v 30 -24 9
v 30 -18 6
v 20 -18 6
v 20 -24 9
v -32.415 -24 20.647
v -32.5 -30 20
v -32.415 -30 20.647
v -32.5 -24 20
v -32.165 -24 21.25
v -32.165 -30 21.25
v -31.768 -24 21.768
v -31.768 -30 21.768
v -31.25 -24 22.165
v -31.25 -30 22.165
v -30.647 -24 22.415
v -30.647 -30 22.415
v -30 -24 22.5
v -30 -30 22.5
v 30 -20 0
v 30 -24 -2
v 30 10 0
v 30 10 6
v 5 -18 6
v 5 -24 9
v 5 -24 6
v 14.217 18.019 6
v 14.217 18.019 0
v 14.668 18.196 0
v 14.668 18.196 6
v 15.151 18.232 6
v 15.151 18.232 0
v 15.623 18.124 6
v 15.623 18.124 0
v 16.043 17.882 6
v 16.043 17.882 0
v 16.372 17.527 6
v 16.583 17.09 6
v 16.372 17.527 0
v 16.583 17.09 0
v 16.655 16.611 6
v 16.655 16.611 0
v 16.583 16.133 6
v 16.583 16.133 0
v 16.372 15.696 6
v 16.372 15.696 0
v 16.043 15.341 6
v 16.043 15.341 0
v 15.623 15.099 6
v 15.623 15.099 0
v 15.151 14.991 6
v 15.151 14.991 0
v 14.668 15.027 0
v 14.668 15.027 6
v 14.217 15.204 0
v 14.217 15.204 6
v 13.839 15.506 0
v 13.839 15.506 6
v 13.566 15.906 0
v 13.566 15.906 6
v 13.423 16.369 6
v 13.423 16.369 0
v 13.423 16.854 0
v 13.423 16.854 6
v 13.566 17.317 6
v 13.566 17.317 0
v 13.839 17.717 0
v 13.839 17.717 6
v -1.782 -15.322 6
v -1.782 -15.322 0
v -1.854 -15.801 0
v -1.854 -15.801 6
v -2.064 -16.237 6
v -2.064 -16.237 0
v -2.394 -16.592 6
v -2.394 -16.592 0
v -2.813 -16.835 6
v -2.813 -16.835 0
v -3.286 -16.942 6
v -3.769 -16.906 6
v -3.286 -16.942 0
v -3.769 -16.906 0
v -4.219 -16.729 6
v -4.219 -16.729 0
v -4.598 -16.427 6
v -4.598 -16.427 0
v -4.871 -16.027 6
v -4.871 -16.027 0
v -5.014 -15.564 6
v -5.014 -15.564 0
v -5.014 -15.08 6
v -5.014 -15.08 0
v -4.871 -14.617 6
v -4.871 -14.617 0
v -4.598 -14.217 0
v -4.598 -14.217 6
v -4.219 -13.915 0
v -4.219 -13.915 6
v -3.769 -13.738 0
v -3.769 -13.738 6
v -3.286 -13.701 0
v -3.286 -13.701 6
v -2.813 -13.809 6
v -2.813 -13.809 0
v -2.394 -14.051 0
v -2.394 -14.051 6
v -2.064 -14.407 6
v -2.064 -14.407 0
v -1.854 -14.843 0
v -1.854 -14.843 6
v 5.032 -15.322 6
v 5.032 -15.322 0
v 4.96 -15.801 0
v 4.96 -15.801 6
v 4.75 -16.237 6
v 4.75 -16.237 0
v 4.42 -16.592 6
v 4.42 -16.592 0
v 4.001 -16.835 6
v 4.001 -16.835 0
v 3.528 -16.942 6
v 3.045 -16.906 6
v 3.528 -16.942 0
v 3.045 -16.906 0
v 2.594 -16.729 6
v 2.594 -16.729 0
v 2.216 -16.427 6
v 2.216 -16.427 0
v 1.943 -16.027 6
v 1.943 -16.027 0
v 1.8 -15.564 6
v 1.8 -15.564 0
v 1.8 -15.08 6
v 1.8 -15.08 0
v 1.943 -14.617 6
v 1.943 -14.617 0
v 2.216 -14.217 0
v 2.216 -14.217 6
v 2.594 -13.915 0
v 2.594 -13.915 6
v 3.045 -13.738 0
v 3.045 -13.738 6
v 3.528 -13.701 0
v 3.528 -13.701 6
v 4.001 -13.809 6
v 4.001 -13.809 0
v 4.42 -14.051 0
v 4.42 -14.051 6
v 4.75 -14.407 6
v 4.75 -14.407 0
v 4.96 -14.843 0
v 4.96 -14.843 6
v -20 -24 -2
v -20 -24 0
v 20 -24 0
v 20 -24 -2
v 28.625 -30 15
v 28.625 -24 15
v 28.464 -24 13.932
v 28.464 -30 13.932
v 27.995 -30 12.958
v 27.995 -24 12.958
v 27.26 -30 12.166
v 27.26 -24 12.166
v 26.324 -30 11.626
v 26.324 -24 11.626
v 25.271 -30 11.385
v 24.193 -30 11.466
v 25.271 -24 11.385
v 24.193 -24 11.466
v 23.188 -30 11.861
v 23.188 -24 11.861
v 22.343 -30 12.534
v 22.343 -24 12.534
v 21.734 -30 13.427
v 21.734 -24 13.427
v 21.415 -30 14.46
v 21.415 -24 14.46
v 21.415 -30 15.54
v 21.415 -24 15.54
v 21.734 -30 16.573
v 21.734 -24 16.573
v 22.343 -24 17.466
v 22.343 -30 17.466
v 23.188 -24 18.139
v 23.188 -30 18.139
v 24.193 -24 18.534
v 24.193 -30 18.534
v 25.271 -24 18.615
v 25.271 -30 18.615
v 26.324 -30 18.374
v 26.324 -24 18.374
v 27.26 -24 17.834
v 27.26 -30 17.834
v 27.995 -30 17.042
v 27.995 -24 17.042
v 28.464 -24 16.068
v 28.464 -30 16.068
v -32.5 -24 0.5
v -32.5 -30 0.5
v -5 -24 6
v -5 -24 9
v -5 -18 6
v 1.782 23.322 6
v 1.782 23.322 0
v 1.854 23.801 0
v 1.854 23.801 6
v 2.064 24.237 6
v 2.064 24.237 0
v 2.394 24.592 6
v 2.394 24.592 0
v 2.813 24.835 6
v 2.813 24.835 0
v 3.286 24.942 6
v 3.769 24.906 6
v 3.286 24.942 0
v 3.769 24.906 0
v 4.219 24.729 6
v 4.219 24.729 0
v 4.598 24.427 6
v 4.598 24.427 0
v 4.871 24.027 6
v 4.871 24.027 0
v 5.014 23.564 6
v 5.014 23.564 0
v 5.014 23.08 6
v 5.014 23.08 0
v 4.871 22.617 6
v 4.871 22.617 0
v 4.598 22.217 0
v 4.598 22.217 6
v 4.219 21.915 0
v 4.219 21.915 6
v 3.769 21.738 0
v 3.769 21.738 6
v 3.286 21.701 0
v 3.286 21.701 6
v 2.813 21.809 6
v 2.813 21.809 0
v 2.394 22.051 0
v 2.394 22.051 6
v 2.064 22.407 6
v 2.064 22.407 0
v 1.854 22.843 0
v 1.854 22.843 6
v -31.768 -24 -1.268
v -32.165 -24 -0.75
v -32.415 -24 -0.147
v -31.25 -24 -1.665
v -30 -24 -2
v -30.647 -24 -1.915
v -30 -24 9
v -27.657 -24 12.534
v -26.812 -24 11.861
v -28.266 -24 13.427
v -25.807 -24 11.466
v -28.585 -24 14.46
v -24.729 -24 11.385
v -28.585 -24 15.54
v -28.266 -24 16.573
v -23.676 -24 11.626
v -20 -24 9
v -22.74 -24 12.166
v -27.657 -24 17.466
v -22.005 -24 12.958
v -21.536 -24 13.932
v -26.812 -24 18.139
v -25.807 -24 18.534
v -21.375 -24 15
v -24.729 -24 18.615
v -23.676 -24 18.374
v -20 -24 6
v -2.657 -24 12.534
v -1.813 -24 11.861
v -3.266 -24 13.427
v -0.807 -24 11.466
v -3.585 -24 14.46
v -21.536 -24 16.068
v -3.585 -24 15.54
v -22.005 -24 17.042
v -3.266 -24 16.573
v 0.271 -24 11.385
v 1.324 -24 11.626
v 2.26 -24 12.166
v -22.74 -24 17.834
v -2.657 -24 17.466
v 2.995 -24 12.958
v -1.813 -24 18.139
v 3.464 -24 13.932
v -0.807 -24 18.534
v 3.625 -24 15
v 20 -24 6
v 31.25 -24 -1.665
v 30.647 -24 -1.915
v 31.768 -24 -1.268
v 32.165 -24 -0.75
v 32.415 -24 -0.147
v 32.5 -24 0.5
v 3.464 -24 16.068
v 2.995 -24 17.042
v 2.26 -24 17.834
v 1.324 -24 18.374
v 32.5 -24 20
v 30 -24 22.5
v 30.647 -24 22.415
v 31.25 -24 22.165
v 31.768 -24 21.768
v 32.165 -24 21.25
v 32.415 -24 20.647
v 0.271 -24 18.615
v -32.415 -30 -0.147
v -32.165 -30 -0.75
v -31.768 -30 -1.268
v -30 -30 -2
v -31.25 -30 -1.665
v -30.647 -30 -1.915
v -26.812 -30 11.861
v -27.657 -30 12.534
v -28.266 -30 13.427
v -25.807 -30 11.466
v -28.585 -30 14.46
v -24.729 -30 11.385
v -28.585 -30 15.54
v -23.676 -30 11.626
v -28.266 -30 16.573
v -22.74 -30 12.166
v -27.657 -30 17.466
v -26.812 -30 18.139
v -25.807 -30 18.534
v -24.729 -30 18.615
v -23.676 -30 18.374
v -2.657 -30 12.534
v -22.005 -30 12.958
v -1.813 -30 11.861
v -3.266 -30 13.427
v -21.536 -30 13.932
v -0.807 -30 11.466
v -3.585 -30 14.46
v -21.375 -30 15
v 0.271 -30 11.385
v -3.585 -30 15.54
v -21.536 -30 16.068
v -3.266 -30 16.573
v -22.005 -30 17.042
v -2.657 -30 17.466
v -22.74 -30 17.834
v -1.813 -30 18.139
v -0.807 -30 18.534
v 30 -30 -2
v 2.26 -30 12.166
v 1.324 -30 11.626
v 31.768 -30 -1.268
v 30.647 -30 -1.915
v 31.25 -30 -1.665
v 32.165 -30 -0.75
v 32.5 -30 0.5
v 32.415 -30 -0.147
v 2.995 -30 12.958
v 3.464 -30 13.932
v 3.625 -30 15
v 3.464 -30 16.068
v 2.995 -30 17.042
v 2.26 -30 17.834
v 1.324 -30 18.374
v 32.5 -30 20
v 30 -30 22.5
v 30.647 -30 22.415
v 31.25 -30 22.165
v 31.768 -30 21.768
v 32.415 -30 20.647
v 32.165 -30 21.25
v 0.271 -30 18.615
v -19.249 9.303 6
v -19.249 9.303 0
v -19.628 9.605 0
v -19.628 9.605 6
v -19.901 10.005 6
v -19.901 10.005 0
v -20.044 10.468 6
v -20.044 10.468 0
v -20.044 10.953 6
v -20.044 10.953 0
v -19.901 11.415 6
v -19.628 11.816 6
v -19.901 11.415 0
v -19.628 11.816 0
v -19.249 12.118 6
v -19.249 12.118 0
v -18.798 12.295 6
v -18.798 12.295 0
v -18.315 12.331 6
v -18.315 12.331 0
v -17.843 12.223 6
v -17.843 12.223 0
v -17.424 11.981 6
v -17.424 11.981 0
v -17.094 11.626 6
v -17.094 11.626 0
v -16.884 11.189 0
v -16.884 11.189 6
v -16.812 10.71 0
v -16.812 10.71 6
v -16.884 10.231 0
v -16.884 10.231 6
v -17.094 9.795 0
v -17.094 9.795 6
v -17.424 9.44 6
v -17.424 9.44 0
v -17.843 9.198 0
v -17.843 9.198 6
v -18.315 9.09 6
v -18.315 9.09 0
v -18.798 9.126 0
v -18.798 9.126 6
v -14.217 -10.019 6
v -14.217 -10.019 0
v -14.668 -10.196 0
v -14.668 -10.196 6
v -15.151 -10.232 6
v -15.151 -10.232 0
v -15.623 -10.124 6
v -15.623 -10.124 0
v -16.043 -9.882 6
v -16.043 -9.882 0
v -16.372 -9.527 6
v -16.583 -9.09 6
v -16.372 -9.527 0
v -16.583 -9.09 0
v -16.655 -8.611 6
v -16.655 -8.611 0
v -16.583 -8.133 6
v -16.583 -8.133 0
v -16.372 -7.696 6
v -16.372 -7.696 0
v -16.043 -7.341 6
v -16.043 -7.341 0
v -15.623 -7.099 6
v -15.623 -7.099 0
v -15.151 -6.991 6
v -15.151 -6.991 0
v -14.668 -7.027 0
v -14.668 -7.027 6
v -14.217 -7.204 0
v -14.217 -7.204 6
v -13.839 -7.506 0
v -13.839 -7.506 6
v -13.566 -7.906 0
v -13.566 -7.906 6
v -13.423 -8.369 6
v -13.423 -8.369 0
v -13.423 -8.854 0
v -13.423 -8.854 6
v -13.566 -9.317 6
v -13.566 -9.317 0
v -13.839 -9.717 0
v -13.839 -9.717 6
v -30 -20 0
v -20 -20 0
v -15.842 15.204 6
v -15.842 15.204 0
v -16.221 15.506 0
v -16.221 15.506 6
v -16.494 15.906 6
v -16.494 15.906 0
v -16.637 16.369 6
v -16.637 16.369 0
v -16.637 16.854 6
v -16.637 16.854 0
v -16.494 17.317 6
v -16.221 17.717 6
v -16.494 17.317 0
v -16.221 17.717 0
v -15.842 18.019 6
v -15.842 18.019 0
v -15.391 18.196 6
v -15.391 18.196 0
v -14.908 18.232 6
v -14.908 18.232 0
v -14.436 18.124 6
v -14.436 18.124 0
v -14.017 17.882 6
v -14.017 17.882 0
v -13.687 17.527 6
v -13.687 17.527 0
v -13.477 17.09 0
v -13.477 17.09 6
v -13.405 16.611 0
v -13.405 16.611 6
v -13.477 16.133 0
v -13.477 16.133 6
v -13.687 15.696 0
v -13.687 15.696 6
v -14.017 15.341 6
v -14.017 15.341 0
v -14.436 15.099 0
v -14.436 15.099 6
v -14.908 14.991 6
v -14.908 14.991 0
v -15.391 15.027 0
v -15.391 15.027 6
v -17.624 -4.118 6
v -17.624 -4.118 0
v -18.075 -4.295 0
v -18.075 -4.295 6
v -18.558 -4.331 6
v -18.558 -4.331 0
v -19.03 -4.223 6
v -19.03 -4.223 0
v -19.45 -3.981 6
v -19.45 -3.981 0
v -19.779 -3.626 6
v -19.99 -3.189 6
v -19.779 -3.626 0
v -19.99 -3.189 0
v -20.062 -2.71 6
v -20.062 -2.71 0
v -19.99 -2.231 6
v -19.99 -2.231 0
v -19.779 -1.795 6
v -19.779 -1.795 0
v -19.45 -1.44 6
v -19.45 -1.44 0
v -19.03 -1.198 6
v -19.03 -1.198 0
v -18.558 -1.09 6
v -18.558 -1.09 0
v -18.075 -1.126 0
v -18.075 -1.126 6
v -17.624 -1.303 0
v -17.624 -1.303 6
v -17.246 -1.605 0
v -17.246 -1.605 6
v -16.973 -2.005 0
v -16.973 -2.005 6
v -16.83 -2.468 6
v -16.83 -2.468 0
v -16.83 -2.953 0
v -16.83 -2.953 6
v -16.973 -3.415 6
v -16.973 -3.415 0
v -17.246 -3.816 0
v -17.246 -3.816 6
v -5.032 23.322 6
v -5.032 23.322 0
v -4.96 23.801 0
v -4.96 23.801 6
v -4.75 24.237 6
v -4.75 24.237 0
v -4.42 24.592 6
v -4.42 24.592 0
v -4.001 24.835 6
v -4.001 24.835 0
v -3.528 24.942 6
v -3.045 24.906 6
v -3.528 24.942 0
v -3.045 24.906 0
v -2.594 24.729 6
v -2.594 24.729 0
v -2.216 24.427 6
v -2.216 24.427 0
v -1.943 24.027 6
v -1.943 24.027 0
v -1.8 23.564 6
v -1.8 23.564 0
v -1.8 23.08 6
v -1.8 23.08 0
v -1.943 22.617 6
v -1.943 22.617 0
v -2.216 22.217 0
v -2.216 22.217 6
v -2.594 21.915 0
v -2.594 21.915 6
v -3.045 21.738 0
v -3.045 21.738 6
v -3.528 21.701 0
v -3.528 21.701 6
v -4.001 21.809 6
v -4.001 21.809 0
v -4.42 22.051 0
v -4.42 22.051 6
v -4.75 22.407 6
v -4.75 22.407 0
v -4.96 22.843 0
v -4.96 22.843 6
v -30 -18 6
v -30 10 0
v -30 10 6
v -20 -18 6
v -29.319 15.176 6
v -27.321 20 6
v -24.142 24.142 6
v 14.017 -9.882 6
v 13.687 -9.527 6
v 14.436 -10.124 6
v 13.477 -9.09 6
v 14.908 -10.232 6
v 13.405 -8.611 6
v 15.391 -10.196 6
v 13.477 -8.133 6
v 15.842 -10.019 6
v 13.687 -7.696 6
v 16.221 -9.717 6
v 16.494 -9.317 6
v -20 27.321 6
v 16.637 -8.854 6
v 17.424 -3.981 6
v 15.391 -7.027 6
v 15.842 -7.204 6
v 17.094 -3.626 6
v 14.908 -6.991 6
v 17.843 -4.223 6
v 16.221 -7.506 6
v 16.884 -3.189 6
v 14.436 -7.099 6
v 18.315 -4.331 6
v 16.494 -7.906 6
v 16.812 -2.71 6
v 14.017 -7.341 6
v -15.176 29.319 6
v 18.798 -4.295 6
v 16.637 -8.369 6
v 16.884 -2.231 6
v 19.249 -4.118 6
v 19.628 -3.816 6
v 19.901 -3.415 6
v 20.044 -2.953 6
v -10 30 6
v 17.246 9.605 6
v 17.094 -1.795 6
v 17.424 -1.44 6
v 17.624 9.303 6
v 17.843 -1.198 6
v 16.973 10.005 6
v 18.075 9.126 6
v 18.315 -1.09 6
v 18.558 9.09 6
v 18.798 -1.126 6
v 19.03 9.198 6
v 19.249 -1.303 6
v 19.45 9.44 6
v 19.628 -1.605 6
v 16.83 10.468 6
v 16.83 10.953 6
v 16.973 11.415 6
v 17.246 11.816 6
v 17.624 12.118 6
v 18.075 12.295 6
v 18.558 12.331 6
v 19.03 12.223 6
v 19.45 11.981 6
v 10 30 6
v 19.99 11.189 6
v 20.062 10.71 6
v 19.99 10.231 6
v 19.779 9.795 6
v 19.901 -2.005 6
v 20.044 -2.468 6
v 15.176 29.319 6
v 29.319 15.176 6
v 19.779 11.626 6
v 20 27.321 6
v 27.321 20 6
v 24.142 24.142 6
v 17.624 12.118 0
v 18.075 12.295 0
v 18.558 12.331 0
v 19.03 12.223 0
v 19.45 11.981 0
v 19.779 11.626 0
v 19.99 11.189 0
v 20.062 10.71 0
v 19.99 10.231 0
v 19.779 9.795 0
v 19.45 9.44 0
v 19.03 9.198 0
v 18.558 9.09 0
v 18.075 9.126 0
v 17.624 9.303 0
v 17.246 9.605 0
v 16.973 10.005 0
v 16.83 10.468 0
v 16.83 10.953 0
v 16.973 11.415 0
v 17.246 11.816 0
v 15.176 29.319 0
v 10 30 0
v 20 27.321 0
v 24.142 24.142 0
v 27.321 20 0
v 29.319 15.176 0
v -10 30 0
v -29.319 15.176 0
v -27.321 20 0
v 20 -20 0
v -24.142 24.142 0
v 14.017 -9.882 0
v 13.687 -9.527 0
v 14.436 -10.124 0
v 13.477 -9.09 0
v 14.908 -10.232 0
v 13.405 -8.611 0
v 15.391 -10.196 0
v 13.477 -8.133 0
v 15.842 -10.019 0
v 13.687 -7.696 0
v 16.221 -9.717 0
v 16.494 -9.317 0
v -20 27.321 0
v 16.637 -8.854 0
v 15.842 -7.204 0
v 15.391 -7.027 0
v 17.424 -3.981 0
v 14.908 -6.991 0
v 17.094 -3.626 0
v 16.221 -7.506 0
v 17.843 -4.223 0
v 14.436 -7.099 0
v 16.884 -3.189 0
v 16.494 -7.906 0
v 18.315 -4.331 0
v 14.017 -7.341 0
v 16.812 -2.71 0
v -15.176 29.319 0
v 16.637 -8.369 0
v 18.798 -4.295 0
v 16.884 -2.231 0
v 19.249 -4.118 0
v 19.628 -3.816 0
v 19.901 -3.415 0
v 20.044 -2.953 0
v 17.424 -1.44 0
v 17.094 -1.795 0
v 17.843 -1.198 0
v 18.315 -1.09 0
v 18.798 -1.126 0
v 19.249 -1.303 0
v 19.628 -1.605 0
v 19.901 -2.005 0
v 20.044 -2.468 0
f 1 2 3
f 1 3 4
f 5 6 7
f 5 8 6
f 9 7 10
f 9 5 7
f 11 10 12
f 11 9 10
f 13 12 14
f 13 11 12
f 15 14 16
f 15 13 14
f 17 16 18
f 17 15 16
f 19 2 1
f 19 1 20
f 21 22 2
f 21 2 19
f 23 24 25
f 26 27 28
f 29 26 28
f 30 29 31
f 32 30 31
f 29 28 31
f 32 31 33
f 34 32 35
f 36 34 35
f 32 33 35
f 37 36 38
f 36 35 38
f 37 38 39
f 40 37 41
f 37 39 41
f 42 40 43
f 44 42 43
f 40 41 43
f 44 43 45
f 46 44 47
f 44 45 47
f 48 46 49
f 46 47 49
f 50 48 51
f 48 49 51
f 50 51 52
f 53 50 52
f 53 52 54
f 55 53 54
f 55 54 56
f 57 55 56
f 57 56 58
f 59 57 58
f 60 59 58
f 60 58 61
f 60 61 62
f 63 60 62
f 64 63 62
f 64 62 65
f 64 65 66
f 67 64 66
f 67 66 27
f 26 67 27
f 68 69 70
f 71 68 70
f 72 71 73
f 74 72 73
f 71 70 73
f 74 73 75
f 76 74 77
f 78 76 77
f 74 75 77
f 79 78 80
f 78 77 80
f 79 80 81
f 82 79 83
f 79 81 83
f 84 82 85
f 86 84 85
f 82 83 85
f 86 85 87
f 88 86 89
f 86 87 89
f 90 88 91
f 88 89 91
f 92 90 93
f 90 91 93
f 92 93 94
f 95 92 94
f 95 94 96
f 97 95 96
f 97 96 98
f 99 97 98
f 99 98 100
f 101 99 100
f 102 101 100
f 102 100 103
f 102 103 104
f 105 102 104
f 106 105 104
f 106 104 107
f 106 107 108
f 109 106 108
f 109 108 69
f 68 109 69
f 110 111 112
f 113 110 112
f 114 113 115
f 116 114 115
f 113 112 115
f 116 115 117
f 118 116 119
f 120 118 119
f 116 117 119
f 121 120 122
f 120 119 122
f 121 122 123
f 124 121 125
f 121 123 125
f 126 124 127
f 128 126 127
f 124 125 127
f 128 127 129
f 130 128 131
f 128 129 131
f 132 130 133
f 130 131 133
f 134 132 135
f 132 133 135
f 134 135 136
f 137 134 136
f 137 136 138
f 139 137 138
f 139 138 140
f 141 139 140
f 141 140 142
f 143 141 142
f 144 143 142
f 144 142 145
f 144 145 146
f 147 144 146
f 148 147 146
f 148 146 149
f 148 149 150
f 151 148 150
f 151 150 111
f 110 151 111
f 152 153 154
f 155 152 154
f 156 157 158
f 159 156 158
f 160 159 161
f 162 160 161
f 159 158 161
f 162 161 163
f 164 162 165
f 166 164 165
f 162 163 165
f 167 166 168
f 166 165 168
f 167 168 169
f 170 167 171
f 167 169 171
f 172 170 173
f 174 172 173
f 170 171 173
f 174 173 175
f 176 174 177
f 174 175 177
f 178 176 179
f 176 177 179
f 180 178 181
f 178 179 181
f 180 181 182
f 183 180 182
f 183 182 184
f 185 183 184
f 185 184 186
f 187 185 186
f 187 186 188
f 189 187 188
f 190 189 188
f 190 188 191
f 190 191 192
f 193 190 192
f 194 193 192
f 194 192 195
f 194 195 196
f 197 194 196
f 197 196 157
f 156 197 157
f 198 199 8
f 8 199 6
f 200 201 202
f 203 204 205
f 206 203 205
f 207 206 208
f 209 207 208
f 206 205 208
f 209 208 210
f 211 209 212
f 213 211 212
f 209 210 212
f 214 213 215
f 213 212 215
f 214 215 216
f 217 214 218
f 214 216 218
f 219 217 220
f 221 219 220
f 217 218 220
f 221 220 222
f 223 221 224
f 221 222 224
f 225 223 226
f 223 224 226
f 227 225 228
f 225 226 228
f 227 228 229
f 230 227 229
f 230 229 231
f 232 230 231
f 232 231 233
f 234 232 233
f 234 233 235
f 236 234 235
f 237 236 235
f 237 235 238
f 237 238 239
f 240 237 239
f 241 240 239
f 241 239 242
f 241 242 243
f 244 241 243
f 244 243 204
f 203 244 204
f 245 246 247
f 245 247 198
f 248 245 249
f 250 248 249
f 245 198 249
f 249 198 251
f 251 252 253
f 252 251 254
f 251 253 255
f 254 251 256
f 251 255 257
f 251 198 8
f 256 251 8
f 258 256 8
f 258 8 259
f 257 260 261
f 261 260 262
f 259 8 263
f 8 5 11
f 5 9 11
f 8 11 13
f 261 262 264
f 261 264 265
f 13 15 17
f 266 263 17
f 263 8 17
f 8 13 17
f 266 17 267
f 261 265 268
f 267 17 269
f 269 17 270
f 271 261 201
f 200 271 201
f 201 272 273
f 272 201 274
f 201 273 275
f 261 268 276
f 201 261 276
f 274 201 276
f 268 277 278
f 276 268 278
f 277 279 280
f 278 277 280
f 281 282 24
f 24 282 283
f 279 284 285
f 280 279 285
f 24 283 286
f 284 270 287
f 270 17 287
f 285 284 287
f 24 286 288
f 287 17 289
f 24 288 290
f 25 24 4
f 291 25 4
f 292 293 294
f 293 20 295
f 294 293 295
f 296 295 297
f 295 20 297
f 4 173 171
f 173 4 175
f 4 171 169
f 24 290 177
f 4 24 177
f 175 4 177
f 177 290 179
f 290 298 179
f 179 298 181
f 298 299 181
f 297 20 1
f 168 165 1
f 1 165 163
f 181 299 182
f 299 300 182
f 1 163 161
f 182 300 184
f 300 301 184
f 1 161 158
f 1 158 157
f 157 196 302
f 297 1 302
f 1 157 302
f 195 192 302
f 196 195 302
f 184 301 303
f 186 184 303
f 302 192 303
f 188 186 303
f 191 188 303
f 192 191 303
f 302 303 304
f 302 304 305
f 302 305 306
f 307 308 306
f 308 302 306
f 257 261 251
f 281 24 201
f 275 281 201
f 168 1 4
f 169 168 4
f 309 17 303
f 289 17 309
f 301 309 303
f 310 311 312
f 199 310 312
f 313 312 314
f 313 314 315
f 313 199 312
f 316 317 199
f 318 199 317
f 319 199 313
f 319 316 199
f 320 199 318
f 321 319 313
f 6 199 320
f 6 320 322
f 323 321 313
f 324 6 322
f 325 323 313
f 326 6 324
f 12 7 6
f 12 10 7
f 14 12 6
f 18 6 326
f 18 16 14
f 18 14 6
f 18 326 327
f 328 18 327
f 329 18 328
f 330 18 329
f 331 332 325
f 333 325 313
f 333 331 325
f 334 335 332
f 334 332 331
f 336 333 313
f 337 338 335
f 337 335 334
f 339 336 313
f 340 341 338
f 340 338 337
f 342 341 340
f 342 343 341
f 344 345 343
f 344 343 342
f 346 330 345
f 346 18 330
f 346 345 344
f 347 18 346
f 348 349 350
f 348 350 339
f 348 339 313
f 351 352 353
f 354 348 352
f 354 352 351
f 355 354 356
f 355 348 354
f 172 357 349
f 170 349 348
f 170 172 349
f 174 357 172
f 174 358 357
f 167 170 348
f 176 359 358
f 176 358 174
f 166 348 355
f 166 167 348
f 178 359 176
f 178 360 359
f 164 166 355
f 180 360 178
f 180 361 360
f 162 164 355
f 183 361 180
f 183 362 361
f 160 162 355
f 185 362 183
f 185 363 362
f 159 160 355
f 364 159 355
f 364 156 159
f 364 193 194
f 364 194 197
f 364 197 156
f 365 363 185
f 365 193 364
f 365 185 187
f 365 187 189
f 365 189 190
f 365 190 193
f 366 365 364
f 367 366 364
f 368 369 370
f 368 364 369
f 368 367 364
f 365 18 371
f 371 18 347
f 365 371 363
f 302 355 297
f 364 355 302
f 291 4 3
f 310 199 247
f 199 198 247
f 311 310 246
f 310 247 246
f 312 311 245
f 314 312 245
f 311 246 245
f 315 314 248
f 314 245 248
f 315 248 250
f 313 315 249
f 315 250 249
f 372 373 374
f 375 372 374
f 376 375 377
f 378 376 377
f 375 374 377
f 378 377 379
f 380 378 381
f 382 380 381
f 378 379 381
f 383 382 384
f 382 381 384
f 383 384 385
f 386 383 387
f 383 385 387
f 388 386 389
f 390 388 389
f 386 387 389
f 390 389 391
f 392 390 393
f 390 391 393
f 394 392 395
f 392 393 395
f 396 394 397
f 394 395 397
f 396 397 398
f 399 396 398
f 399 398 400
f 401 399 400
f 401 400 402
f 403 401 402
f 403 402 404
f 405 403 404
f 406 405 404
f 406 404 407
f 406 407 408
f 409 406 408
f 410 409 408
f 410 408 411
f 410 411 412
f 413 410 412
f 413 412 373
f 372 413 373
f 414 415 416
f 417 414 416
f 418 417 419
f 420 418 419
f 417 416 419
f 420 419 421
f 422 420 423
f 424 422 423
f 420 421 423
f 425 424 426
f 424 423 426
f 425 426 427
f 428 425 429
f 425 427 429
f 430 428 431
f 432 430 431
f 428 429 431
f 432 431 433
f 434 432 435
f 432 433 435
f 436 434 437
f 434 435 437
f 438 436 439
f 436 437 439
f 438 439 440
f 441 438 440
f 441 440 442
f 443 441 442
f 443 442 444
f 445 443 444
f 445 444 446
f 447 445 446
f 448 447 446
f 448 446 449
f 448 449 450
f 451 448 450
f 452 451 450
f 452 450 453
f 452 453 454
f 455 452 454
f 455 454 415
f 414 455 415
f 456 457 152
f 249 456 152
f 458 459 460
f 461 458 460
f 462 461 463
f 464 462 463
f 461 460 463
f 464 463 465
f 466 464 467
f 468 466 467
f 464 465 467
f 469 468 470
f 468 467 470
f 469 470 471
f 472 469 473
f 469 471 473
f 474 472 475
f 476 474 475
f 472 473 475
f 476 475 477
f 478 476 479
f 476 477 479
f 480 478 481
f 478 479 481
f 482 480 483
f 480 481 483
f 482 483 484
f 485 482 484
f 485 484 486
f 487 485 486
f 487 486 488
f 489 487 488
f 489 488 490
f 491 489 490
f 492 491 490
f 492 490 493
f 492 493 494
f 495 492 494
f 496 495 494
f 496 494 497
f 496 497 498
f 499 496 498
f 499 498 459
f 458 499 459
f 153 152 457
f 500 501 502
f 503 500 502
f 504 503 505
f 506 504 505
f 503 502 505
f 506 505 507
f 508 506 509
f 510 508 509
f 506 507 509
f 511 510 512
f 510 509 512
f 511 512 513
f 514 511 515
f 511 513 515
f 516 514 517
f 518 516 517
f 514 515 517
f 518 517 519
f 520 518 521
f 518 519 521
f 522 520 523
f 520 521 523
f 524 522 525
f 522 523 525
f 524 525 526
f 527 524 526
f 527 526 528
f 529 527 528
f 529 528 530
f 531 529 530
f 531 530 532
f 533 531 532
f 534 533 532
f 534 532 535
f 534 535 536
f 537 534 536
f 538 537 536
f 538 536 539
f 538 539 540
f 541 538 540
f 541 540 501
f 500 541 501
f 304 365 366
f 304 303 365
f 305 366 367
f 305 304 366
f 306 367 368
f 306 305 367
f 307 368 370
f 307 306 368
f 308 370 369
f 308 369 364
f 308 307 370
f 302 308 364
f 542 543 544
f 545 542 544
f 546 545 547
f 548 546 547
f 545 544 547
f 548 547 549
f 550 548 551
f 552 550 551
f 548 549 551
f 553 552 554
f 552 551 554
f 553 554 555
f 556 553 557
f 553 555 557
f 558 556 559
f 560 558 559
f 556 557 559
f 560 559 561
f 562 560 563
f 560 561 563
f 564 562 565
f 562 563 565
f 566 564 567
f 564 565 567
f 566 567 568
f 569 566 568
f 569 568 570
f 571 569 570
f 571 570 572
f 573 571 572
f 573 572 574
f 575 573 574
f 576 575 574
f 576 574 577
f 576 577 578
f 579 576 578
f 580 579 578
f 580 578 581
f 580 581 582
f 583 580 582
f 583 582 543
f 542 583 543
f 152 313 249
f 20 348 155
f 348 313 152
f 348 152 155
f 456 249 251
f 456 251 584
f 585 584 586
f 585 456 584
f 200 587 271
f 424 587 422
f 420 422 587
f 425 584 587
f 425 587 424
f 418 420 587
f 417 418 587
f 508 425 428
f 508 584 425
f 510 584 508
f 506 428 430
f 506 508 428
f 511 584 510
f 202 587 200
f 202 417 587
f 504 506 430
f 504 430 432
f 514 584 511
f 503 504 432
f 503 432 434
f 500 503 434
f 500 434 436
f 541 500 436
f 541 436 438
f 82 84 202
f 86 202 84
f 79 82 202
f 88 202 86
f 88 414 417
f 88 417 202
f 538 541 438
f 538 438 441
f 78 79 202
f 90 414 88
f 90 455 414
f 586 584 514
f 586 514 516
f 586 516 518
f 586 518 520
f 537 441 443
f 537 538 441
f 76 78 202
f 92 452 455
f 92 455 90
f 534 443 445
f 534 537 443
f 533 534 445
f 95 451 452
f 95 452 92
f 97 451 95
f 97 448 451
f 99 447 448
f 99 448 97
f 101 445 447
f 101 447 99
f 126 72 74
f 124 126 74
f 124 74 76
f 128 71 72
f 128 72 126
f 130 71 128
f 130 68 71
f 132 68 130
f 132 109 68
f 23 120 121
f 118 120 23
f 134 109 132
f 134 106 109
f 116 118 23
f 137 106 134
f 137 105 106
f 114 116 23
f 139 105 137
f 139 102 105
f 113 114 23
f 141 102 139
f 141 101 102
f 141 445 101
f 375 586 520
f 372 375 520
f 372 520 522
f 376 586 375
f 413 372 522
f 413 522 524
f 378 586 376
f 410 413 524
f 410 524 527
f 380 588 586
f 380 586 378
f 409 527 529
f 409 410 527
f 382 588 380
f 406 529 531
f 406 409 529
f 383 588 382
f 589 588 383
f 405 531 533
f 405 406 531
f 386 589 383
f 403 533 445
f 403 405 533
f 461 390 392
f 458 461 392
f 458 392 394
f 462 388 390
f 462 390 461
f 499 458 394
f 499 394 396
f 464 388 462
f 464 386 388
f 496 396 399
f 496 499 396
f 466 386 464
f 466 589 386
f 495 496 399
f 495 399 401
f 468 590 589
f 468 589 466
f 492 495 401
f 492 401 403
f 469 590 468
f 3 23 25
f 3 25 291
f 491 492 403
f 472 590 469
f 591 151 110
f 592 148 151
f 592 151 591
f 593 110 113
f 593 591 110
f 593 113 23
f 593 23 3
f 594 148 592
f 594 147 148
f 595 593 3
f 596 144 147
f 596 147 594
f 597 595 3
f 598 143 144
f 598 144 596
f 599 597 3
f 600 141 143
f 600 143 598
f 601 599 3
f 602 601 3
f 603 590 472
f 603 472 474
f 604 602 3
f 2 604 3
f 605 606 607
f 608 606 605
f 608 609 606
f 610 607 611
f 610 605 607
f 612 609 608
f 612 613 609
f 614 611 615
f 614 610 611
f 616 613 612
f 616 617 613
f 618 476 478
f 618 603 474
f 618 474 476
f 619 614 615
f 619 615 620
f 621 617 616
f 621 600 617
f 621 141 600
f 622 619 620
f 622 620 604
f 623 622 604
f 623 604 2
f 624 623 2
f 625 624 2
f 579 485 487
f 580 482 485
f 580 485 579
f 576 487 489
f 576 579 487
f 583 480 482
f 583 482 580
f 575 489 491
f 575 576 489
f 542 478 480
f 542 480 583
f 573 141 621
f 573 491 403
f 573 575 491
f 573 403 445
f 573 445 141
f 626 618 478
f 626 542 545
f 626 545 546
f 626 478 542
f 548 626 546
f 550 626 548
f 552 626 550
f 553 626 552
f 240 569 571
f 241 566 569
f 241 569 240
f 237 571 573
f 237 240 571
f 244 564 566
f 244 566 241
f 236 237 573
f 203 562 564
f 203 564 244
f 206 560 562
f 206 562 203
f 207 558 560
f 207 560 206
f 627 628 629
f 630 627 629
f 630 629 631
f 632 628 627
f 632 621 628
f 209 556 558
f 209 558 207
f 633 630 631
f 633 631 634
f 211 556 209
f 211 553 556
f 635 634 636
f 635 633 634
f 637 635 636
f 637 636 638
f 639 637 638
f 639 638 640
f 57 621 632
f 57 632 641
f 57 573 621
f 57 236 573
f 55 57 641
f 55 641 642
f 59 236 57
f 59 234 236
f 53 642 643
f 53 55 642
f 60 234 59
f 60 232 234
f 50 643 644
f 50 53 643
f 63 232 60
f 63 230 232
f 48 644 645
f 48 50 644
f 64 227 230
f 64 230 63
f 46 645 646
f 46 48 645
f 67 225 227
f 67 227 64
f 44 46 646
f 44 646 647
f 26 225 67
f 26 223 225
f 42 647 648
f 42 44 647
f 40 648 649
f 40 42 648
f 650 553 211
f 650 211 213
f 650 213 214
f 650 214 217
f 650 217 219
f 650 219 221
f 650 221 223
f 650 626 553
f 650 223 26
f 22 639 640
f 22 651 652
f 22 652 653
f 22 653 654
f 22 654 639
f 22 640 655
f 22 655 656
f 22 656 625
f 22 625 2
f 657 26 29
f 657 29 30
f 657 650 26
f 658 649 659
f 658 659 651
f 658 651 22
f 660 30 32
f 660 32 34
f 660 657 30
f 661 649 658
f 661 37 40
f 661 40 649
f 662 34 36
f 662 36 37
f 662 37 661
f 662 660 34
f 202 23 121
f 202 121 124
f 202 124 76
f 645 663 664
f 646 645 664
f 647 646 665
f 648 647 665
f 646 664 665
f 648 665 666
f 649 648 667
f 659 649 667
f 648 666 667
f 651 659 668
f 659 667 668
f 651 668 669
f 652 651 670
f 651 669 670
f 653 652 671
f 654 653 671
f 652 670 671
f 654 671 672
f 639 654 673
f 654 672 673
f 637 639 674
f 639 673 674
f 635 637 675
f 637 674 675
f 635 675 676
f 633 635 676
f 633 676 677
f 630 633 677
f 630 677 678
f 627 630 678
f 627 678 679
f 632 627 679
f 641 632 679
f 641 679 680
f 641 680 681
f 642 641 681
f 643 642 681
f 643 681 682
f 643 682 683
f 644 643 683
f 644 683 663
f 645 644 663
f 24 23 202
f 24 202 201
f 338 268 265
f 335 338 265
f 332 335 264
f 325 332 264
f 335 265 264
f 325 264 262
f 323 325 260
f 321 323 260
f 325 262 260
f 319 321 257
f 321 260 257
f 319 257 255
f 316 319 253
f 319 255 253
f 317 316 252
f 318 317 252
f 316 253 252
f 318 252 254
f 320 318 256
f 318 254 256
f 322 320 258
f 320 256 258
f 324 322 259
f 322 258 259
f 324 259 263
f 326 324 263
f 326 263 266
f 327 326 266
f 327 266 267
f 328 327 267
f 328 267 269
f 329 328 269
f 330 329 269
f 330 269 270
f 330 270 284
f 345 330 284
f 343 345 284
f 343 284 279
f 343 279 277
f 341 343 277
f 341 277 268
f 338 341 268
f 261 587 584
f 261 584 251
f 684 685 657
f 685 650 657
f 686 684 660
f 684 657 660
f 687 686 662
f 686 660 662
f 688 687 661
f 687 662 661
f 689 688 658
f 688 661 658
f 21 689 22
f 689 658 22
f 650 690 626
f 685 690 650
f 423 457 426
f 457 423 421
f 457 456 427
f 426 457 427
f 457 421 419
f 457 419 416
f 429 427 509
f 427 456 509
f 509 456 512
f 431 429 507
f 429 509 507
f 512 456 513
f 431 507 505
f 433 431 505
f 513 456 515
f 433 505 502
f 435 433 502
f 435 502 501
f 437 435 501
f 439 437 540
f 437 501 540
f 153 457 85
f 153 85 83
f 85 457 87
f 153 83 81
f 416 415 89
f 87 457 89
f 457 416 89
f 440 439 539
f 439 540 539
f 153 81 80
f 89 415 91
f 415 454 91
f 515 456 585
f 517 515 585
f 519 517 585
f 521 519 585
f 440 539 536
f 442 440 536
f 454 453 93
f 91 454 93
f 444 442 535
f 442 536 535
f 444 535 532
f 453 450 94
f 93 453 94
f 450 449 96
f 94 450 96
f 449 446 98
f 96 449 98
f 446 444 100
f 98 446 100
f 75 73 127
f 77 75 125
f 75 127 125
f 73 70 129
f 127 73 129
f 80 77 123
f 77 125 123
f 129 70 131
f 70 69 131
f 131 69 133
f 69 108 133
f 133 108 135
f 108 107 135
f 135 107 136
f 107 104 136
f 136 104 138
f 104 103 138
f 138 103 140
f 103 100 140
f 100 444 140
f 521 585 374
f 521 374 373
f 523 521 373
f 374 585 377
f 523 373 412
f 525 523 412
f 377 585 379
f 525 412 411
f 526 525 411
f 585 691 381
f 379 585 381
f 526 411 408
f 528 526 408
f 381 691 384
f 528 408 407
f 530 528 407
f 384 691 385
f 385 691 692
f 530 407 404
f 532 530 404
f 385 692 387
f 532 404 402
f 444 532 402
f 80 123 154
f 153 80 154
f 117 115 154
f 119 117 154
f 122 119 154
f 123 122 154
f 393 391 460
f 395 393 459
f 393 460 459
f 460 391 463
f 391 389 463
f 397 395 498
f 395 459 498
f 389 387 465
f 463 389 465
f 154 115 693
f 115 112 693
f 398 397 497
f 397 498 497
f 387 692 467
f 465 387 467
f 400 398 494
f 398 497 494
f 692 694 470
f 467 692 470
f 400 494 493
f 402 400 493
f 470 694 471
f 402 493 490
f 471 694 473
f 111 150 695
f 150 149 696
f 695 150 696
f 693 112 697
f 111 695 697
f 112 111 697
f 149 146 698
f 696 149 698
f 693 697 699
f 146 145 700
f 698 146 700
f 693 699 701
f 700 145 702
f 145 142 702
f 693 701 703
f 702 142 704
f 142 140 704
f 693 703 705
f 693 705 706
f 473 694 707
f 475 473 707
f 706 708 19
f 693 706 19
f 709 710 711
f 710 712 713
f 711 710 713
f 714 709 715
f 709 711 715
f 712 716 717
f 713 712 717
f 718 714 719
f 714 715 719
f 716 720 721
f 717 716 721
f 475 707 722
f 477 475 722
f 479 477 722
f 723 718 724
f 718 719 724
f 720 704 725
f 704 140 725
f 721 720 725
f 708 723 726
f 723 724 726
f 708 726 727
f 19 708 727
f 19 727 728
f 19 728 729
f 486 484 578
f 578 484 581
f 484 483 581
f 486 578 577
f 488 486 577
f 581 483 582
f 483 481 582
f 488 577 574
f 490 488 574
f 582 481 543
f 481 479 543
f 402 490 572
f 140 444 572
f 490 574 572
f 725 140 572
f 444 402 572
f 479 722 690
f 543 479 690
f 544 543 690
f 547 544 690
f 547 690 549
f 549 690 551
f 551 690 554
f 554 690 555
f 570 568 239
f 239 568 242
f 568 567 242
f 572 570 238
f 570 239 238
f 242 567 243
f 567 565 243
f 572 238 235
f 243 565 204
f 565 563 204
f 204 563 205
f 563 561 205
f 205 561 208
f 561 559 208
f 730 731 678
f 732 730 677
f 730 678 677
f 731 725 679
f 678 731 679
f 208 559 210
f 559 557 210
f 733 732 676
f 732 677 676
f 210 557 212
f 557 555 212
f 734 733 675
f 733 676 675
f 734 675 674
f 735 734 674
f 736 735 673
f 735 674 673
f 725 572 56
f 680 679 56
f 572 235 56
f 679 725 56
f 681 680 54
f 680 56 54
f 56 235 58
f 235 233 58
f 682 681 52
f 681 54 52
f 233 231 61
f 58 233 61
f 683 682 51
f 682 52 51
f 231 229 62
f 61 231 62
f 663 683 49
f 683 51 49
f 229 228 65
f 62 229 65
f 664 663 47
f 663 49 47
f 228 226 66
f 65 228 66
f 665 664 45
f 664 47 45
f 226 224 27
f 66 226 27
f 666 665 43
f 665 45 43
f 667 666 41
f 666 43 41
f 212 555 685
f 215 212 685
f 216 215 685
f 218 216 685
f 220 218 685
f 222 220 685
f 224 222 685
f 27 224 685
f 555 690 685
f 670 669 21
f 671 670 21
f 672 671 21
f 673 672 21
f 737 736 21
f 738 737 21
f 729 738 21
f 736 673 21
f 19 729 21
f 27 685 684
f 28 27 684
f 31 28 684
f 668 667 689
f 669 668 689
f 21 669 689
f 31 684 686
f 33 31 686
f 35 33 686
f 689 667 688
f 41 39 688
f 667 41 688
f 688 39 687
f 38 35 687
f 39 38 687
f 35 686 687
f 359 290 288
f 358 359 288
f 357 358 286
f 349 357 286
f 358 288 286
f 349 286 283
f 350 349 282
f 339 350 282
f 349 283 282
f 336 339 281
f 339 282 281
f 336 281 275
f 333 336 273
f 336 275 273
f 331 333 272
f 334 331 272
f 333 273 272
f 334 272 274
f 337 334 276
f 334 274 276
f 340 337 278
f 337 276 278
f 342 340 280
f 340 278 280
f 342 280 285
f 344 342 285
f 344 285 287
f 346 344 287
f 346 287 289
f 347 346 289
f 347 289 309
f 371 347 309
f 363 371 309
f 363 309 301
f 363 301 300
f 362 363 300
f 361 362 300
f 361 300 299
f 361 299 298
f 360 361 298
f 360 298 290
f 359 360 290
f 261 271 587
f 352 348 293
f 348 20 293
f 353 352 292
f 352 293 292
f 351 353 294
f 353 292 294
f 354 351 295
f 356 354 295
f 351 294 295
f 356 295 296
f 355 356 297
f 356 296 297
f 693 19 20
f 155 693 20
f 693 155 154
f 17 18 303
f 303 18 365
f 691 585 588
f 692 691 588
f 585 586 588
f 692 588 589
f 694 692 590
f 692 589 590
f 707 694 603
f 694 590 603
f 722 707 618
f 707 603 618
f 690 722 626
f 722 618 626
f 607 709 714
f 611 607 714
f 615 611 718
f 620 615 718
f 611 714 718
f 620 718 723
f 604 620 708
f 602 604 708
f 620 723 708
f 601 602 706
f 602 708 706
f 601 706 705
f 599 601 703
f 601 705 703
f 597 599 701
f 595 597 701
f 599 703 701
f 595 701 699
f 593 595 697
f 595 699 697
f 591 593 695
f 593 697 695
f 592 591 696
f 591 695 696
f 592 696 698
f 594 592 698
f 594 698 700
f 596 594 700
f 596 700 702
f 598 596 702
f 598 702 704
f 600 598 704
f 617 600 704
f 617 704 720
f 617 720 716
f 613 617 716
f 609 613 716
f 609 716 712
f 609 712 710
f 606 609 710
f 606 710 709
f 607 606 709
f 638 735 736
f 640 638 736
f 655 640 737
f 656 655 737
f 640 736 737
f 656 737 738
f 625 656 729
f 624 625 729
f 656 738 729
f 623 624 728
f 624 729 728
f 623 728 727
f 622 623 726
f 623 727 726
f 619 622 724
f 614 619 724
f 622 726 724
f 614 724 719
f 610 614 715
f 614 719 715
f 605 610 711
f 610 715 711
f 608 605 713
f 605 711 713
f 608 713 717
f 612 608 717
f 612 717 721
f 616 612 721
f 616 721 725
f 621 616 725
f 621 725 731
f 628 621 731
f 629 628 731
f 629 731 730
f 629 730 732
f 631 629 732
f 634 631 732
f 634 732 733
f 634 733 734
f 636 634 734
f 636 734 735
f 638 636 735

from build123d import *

# Parameters (mm, degrees)
SKETCH1_W           = 60
SKETCH1_H           = 60
BOSS_EXTRUDE1_DEPTH = 6
SKETCH2_W           = 10
SKETCH2_H           = 6
BOSS_EXTRUDE2_DEPTH = 14
BOSS_EXTRUDE3_DEPTH = 10
SKETCH4_R           = 3.625
CUT_EXTRUDE1_DEPTH  = 15
LPATTERN2_COUNT     = 3
LPATTERN2_PITCH     = 25
SKETCH5_R           = 1.625
CUT_EXTRUDE2_DEPTH  = 15
CIRPATTERN2_COUNT   = 6
FILLET1_R           = 20
SKETCH_3_W          = 65
SKETCH_3_H          = 40
SKETCH_3_R          = 3.625
EXTRUDE_1_DEPTH     = 6
SKETCH_6_W          = 15.5
SKETCH_6_H          = 6
CUT_EXTRUDE_2_DEPTH = 65
FILLET_2_R          = 2.5
SKETCH_7_W          = 2
SKETCH_7_H          = 4
CUT_EXTRUDE_3_DEPTH = 10


with BuildPart() as part:
    # Sketch1 → Boss-Extrude1 (new body)
    with BuildSketch(Plane.XY):
        Rectangle(SKETCH1_W, SKETCH1_H)
    extrude(amount=BOSS_EXTRUDE1_DEPTH)

    # Sketch2 → Boss-Extrude2 (add)
    with BuildSketch(Plane.XY.offset(6)):
        with Locations((25, -27)):
            Rectangle(SKETCH2_W, SKETCH2_H)
    boss_extrude2 = extrude(amount=BOSS_EXTRUDE2_DEPTH)

    # Sketch3 → Boss-Extrude3 (add)
    with BuildSketch(Plane(origin=(30, 0, 0), x_dir=(0, 0, -1), z_dir=(1, 0, 0))):
        Polygon((-6, -18), (-9, -24), (-6, -24), align=None)
        Polygon((0, -20), (2, -24), (0, -24), align=None)
    boss_extrude3 = extrude(amount=-BOSS_EXTRUDE3_DEPTH)

    # Sketch4 → Cut-Extrude1 (cut)
    with BuildSketch(Plane(origin=(0, -24, 0), x_dir=(1, 0, 0), z_dir=(0, 1, 0))):
        with Locations((25, -15)):
            Circle(SKETCH4_R)
    cut_extrude1 = extrude(amount=-CUT_EXTRUDE1_DEPTH, mode=Mode.SUBTRACT)

    # LPattern2: Boss-Extrude2, Boss-Extrude3, Cut-Extrude1 ×3
    with Locations(*[(-i * LPATTERN2_PITCH, 0, 0) for i in range(1, LPATTERN2_COUNT)]):
        add(boss_extrude2)
        add(boss_extrude3)
        add(cut_extrude1, mode=Mode.SUBTRACT)

    # Sketch5 → Cut-Extrude2 (cut)
    with BuildSketch(Plane(origin=(0, 0, 0), x_dir=(-1, 0, 0), z_dir=(0, 0, -1))):
        with Locations((3.406977246, 23.321928114)):
            Circle(SKETCH5_R)
        with Locations((-3.406977246, 23.321928114)):
            Circle(SKETCH5_R)
    cut_extrude2 = extrude(amount=-CUT_EXTRUDE2_DEPTH, mode=Mode.SUBTRACT)

    # CirPattern2: Cut-Extrude2 ×6 about axis
    cirpattern2_axis = Axis((0, 4, 0), (0, 0, 1))
    for i in range(1, CIRPATTERN2_COUNT):
        add(cut_extrude2.rotate(cirpattern2_axis, i * 360 / CIRPATTERN2_COUNT), mode=Mode.SUBTRACT)

    # Fillet1
    fillet1_edges = [part.edges().sort_by_distance(p)[0] for p in [
        (-30, 30, 3),
        (30, 30, 3),
    ]]
    fillet(fillet1_edges, radius=FILLET1_R)

    # 스케치3 → 보스-돌출1 (add)
    with BuildSketch(Plane.XZ.offset(30)):
        with Locations((0, 2.5)):
            Rectangle(SKETCH_3_W, SKETCH_3_H)
        with Locations((-25, 15)):
            Circle(SKETCH_3_R, mode=Mode.SUBTRACT)
        with Locations((0, 15)):
            Circle(SKETCH_3_R, mode=Mode.SUBTRACT)
        with Locations((25, 15)):
            Circle(SKETCH_3_R, mode=Mode.SUBTRACT)
        with Locations((-25, -10)):
            Circle(SKETCH_3_R, mode=Mode.SUBTRACT)
        with Locations((0, -10)):
            Circle(SKETCH_3_R, mode=Mode.SUBTRACT)
        with Locations((25, -10)):
            Circle(SKETCH_3_R, mode=Mode.SUBTRACT)
    extrude(amount=-EXTRUDE_1_DEPTH)

    # 스케치6 → 컷-돌출2 (cut)
    with BuildSketch(Plane(origin=(32.5, 0, 0), x_dir=(0, 0, -1), z_dir=(1, 0, 0))):
        with Locations((9.75, -27)):
            Rectangle(SKETCH_6_W, SKETCH_6_H)
    extrude(amount=-CUT_EXTRUDE_2_DEPTH, mode=Mode.SUBTRACT)

    # 필렛2
    fillet_2_edges = [part.edges().sort_by_distance(p)[0] for p in [
        (-32.5, -27, 22.5),
        (-32.5, -27, -2),
        (32.5, -27, 22.5),
        (32.5, -27, -2),
    ]]
    fillet(fillet_2_edges, radius=FILLET_2_R)

    # 스케치7 → 컷-돌출3 (cut)
    with BuildSketch(Plane(origin=(5, 0, 0), x_dir=(0, 0, -1), z_dir=(1, 0, 0))):
        with Locations((1, -22)):
            Rectangle(SKETCH_7_W, SKETCH_7_H)
    extrude(amount=-CUT_EXTRUDE_3_DEPTH, mode=Mode.SUBTRACT)


solid = part.part
